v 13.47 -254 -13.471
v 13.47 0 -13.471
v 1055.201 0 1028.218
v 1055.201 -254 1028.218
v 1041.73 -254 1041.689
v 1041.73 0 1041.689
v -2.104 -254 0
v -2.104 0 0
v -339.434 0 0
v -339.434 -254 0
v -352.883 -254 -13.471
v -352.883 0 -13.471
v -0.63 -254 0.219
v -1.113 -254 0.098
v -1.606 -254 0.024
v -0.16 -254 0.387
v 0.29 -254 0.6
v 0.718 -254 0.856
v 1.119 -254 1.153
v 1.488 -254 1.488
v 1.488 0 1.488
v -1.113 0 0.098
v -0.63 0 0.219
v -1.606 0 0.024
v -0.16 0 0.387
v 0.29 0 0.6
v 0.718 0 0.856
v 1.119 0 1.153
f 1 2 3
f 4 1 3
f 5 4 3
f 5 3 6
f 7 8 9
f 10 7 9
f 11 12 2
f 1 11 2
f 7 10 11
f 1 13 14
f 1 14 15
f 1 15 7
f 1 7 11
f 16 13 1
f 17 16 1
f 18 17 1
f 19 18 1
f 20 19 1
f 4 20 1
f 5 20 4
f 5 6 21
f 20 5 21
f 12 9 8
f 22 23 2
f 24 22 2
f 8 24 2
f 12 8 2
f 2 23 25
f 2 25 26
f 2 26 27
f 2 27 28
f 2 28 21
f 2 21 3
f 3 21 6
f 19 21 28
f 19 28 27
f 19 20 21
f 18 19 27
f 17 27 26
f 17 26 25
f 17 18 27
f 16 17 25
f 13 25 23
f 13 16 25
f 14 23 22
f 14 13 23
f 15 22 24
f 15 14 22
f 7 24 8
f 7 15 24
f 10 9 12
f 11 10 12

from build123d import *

# Parameters (mm, degrees)
F1_DEPTH    = 254
F2_T1_DEPTH = 332.3831903594
F3_R        = 5.08


# Not quite as in the source:
# - a fillet or chamfer that OpenCascade refuses, or shapes differently, is made with other operations: its cross-section is extruded or revolved along the edge and cut away or added


with BuildPart() as f1:
    # F0 (on Front) → F1 (new body)
    with BuildSketch(Plane.XZ):
        Polygon((1041.7304627271, 1041.6889569475), (0, 0), (-354.6740262396, 0), (-354.6520841774, -13.4706525353), (13.4701158226, -13.4706525353), (1055.2005785497, 1028.2183044122), align=None)
    extrude(amount=F1_DEPTH)

    # F2: chamfer of 15.24 on 1 edges, made by hand

    # F2_s2 → F2_t1 (cut)
    with BuildSketch(Plane.XZ.offset(-39.1915951797)):
        Polygon((-339.4340262396, 0), (-354.6492021575, -15.2399797823), (-354.6740262396, 0), align=None)
    extrude(amount=F2_T1_DEPTH, mode=Mode.SUBTRACT)

    # F3
    f3_edges = [f1.edges().sort_by_distance(p)[0] for p in [
        (0, -127, 0),
    ]]
    fillet(f3_edges, radius=F3_R)


solid = f1.part
